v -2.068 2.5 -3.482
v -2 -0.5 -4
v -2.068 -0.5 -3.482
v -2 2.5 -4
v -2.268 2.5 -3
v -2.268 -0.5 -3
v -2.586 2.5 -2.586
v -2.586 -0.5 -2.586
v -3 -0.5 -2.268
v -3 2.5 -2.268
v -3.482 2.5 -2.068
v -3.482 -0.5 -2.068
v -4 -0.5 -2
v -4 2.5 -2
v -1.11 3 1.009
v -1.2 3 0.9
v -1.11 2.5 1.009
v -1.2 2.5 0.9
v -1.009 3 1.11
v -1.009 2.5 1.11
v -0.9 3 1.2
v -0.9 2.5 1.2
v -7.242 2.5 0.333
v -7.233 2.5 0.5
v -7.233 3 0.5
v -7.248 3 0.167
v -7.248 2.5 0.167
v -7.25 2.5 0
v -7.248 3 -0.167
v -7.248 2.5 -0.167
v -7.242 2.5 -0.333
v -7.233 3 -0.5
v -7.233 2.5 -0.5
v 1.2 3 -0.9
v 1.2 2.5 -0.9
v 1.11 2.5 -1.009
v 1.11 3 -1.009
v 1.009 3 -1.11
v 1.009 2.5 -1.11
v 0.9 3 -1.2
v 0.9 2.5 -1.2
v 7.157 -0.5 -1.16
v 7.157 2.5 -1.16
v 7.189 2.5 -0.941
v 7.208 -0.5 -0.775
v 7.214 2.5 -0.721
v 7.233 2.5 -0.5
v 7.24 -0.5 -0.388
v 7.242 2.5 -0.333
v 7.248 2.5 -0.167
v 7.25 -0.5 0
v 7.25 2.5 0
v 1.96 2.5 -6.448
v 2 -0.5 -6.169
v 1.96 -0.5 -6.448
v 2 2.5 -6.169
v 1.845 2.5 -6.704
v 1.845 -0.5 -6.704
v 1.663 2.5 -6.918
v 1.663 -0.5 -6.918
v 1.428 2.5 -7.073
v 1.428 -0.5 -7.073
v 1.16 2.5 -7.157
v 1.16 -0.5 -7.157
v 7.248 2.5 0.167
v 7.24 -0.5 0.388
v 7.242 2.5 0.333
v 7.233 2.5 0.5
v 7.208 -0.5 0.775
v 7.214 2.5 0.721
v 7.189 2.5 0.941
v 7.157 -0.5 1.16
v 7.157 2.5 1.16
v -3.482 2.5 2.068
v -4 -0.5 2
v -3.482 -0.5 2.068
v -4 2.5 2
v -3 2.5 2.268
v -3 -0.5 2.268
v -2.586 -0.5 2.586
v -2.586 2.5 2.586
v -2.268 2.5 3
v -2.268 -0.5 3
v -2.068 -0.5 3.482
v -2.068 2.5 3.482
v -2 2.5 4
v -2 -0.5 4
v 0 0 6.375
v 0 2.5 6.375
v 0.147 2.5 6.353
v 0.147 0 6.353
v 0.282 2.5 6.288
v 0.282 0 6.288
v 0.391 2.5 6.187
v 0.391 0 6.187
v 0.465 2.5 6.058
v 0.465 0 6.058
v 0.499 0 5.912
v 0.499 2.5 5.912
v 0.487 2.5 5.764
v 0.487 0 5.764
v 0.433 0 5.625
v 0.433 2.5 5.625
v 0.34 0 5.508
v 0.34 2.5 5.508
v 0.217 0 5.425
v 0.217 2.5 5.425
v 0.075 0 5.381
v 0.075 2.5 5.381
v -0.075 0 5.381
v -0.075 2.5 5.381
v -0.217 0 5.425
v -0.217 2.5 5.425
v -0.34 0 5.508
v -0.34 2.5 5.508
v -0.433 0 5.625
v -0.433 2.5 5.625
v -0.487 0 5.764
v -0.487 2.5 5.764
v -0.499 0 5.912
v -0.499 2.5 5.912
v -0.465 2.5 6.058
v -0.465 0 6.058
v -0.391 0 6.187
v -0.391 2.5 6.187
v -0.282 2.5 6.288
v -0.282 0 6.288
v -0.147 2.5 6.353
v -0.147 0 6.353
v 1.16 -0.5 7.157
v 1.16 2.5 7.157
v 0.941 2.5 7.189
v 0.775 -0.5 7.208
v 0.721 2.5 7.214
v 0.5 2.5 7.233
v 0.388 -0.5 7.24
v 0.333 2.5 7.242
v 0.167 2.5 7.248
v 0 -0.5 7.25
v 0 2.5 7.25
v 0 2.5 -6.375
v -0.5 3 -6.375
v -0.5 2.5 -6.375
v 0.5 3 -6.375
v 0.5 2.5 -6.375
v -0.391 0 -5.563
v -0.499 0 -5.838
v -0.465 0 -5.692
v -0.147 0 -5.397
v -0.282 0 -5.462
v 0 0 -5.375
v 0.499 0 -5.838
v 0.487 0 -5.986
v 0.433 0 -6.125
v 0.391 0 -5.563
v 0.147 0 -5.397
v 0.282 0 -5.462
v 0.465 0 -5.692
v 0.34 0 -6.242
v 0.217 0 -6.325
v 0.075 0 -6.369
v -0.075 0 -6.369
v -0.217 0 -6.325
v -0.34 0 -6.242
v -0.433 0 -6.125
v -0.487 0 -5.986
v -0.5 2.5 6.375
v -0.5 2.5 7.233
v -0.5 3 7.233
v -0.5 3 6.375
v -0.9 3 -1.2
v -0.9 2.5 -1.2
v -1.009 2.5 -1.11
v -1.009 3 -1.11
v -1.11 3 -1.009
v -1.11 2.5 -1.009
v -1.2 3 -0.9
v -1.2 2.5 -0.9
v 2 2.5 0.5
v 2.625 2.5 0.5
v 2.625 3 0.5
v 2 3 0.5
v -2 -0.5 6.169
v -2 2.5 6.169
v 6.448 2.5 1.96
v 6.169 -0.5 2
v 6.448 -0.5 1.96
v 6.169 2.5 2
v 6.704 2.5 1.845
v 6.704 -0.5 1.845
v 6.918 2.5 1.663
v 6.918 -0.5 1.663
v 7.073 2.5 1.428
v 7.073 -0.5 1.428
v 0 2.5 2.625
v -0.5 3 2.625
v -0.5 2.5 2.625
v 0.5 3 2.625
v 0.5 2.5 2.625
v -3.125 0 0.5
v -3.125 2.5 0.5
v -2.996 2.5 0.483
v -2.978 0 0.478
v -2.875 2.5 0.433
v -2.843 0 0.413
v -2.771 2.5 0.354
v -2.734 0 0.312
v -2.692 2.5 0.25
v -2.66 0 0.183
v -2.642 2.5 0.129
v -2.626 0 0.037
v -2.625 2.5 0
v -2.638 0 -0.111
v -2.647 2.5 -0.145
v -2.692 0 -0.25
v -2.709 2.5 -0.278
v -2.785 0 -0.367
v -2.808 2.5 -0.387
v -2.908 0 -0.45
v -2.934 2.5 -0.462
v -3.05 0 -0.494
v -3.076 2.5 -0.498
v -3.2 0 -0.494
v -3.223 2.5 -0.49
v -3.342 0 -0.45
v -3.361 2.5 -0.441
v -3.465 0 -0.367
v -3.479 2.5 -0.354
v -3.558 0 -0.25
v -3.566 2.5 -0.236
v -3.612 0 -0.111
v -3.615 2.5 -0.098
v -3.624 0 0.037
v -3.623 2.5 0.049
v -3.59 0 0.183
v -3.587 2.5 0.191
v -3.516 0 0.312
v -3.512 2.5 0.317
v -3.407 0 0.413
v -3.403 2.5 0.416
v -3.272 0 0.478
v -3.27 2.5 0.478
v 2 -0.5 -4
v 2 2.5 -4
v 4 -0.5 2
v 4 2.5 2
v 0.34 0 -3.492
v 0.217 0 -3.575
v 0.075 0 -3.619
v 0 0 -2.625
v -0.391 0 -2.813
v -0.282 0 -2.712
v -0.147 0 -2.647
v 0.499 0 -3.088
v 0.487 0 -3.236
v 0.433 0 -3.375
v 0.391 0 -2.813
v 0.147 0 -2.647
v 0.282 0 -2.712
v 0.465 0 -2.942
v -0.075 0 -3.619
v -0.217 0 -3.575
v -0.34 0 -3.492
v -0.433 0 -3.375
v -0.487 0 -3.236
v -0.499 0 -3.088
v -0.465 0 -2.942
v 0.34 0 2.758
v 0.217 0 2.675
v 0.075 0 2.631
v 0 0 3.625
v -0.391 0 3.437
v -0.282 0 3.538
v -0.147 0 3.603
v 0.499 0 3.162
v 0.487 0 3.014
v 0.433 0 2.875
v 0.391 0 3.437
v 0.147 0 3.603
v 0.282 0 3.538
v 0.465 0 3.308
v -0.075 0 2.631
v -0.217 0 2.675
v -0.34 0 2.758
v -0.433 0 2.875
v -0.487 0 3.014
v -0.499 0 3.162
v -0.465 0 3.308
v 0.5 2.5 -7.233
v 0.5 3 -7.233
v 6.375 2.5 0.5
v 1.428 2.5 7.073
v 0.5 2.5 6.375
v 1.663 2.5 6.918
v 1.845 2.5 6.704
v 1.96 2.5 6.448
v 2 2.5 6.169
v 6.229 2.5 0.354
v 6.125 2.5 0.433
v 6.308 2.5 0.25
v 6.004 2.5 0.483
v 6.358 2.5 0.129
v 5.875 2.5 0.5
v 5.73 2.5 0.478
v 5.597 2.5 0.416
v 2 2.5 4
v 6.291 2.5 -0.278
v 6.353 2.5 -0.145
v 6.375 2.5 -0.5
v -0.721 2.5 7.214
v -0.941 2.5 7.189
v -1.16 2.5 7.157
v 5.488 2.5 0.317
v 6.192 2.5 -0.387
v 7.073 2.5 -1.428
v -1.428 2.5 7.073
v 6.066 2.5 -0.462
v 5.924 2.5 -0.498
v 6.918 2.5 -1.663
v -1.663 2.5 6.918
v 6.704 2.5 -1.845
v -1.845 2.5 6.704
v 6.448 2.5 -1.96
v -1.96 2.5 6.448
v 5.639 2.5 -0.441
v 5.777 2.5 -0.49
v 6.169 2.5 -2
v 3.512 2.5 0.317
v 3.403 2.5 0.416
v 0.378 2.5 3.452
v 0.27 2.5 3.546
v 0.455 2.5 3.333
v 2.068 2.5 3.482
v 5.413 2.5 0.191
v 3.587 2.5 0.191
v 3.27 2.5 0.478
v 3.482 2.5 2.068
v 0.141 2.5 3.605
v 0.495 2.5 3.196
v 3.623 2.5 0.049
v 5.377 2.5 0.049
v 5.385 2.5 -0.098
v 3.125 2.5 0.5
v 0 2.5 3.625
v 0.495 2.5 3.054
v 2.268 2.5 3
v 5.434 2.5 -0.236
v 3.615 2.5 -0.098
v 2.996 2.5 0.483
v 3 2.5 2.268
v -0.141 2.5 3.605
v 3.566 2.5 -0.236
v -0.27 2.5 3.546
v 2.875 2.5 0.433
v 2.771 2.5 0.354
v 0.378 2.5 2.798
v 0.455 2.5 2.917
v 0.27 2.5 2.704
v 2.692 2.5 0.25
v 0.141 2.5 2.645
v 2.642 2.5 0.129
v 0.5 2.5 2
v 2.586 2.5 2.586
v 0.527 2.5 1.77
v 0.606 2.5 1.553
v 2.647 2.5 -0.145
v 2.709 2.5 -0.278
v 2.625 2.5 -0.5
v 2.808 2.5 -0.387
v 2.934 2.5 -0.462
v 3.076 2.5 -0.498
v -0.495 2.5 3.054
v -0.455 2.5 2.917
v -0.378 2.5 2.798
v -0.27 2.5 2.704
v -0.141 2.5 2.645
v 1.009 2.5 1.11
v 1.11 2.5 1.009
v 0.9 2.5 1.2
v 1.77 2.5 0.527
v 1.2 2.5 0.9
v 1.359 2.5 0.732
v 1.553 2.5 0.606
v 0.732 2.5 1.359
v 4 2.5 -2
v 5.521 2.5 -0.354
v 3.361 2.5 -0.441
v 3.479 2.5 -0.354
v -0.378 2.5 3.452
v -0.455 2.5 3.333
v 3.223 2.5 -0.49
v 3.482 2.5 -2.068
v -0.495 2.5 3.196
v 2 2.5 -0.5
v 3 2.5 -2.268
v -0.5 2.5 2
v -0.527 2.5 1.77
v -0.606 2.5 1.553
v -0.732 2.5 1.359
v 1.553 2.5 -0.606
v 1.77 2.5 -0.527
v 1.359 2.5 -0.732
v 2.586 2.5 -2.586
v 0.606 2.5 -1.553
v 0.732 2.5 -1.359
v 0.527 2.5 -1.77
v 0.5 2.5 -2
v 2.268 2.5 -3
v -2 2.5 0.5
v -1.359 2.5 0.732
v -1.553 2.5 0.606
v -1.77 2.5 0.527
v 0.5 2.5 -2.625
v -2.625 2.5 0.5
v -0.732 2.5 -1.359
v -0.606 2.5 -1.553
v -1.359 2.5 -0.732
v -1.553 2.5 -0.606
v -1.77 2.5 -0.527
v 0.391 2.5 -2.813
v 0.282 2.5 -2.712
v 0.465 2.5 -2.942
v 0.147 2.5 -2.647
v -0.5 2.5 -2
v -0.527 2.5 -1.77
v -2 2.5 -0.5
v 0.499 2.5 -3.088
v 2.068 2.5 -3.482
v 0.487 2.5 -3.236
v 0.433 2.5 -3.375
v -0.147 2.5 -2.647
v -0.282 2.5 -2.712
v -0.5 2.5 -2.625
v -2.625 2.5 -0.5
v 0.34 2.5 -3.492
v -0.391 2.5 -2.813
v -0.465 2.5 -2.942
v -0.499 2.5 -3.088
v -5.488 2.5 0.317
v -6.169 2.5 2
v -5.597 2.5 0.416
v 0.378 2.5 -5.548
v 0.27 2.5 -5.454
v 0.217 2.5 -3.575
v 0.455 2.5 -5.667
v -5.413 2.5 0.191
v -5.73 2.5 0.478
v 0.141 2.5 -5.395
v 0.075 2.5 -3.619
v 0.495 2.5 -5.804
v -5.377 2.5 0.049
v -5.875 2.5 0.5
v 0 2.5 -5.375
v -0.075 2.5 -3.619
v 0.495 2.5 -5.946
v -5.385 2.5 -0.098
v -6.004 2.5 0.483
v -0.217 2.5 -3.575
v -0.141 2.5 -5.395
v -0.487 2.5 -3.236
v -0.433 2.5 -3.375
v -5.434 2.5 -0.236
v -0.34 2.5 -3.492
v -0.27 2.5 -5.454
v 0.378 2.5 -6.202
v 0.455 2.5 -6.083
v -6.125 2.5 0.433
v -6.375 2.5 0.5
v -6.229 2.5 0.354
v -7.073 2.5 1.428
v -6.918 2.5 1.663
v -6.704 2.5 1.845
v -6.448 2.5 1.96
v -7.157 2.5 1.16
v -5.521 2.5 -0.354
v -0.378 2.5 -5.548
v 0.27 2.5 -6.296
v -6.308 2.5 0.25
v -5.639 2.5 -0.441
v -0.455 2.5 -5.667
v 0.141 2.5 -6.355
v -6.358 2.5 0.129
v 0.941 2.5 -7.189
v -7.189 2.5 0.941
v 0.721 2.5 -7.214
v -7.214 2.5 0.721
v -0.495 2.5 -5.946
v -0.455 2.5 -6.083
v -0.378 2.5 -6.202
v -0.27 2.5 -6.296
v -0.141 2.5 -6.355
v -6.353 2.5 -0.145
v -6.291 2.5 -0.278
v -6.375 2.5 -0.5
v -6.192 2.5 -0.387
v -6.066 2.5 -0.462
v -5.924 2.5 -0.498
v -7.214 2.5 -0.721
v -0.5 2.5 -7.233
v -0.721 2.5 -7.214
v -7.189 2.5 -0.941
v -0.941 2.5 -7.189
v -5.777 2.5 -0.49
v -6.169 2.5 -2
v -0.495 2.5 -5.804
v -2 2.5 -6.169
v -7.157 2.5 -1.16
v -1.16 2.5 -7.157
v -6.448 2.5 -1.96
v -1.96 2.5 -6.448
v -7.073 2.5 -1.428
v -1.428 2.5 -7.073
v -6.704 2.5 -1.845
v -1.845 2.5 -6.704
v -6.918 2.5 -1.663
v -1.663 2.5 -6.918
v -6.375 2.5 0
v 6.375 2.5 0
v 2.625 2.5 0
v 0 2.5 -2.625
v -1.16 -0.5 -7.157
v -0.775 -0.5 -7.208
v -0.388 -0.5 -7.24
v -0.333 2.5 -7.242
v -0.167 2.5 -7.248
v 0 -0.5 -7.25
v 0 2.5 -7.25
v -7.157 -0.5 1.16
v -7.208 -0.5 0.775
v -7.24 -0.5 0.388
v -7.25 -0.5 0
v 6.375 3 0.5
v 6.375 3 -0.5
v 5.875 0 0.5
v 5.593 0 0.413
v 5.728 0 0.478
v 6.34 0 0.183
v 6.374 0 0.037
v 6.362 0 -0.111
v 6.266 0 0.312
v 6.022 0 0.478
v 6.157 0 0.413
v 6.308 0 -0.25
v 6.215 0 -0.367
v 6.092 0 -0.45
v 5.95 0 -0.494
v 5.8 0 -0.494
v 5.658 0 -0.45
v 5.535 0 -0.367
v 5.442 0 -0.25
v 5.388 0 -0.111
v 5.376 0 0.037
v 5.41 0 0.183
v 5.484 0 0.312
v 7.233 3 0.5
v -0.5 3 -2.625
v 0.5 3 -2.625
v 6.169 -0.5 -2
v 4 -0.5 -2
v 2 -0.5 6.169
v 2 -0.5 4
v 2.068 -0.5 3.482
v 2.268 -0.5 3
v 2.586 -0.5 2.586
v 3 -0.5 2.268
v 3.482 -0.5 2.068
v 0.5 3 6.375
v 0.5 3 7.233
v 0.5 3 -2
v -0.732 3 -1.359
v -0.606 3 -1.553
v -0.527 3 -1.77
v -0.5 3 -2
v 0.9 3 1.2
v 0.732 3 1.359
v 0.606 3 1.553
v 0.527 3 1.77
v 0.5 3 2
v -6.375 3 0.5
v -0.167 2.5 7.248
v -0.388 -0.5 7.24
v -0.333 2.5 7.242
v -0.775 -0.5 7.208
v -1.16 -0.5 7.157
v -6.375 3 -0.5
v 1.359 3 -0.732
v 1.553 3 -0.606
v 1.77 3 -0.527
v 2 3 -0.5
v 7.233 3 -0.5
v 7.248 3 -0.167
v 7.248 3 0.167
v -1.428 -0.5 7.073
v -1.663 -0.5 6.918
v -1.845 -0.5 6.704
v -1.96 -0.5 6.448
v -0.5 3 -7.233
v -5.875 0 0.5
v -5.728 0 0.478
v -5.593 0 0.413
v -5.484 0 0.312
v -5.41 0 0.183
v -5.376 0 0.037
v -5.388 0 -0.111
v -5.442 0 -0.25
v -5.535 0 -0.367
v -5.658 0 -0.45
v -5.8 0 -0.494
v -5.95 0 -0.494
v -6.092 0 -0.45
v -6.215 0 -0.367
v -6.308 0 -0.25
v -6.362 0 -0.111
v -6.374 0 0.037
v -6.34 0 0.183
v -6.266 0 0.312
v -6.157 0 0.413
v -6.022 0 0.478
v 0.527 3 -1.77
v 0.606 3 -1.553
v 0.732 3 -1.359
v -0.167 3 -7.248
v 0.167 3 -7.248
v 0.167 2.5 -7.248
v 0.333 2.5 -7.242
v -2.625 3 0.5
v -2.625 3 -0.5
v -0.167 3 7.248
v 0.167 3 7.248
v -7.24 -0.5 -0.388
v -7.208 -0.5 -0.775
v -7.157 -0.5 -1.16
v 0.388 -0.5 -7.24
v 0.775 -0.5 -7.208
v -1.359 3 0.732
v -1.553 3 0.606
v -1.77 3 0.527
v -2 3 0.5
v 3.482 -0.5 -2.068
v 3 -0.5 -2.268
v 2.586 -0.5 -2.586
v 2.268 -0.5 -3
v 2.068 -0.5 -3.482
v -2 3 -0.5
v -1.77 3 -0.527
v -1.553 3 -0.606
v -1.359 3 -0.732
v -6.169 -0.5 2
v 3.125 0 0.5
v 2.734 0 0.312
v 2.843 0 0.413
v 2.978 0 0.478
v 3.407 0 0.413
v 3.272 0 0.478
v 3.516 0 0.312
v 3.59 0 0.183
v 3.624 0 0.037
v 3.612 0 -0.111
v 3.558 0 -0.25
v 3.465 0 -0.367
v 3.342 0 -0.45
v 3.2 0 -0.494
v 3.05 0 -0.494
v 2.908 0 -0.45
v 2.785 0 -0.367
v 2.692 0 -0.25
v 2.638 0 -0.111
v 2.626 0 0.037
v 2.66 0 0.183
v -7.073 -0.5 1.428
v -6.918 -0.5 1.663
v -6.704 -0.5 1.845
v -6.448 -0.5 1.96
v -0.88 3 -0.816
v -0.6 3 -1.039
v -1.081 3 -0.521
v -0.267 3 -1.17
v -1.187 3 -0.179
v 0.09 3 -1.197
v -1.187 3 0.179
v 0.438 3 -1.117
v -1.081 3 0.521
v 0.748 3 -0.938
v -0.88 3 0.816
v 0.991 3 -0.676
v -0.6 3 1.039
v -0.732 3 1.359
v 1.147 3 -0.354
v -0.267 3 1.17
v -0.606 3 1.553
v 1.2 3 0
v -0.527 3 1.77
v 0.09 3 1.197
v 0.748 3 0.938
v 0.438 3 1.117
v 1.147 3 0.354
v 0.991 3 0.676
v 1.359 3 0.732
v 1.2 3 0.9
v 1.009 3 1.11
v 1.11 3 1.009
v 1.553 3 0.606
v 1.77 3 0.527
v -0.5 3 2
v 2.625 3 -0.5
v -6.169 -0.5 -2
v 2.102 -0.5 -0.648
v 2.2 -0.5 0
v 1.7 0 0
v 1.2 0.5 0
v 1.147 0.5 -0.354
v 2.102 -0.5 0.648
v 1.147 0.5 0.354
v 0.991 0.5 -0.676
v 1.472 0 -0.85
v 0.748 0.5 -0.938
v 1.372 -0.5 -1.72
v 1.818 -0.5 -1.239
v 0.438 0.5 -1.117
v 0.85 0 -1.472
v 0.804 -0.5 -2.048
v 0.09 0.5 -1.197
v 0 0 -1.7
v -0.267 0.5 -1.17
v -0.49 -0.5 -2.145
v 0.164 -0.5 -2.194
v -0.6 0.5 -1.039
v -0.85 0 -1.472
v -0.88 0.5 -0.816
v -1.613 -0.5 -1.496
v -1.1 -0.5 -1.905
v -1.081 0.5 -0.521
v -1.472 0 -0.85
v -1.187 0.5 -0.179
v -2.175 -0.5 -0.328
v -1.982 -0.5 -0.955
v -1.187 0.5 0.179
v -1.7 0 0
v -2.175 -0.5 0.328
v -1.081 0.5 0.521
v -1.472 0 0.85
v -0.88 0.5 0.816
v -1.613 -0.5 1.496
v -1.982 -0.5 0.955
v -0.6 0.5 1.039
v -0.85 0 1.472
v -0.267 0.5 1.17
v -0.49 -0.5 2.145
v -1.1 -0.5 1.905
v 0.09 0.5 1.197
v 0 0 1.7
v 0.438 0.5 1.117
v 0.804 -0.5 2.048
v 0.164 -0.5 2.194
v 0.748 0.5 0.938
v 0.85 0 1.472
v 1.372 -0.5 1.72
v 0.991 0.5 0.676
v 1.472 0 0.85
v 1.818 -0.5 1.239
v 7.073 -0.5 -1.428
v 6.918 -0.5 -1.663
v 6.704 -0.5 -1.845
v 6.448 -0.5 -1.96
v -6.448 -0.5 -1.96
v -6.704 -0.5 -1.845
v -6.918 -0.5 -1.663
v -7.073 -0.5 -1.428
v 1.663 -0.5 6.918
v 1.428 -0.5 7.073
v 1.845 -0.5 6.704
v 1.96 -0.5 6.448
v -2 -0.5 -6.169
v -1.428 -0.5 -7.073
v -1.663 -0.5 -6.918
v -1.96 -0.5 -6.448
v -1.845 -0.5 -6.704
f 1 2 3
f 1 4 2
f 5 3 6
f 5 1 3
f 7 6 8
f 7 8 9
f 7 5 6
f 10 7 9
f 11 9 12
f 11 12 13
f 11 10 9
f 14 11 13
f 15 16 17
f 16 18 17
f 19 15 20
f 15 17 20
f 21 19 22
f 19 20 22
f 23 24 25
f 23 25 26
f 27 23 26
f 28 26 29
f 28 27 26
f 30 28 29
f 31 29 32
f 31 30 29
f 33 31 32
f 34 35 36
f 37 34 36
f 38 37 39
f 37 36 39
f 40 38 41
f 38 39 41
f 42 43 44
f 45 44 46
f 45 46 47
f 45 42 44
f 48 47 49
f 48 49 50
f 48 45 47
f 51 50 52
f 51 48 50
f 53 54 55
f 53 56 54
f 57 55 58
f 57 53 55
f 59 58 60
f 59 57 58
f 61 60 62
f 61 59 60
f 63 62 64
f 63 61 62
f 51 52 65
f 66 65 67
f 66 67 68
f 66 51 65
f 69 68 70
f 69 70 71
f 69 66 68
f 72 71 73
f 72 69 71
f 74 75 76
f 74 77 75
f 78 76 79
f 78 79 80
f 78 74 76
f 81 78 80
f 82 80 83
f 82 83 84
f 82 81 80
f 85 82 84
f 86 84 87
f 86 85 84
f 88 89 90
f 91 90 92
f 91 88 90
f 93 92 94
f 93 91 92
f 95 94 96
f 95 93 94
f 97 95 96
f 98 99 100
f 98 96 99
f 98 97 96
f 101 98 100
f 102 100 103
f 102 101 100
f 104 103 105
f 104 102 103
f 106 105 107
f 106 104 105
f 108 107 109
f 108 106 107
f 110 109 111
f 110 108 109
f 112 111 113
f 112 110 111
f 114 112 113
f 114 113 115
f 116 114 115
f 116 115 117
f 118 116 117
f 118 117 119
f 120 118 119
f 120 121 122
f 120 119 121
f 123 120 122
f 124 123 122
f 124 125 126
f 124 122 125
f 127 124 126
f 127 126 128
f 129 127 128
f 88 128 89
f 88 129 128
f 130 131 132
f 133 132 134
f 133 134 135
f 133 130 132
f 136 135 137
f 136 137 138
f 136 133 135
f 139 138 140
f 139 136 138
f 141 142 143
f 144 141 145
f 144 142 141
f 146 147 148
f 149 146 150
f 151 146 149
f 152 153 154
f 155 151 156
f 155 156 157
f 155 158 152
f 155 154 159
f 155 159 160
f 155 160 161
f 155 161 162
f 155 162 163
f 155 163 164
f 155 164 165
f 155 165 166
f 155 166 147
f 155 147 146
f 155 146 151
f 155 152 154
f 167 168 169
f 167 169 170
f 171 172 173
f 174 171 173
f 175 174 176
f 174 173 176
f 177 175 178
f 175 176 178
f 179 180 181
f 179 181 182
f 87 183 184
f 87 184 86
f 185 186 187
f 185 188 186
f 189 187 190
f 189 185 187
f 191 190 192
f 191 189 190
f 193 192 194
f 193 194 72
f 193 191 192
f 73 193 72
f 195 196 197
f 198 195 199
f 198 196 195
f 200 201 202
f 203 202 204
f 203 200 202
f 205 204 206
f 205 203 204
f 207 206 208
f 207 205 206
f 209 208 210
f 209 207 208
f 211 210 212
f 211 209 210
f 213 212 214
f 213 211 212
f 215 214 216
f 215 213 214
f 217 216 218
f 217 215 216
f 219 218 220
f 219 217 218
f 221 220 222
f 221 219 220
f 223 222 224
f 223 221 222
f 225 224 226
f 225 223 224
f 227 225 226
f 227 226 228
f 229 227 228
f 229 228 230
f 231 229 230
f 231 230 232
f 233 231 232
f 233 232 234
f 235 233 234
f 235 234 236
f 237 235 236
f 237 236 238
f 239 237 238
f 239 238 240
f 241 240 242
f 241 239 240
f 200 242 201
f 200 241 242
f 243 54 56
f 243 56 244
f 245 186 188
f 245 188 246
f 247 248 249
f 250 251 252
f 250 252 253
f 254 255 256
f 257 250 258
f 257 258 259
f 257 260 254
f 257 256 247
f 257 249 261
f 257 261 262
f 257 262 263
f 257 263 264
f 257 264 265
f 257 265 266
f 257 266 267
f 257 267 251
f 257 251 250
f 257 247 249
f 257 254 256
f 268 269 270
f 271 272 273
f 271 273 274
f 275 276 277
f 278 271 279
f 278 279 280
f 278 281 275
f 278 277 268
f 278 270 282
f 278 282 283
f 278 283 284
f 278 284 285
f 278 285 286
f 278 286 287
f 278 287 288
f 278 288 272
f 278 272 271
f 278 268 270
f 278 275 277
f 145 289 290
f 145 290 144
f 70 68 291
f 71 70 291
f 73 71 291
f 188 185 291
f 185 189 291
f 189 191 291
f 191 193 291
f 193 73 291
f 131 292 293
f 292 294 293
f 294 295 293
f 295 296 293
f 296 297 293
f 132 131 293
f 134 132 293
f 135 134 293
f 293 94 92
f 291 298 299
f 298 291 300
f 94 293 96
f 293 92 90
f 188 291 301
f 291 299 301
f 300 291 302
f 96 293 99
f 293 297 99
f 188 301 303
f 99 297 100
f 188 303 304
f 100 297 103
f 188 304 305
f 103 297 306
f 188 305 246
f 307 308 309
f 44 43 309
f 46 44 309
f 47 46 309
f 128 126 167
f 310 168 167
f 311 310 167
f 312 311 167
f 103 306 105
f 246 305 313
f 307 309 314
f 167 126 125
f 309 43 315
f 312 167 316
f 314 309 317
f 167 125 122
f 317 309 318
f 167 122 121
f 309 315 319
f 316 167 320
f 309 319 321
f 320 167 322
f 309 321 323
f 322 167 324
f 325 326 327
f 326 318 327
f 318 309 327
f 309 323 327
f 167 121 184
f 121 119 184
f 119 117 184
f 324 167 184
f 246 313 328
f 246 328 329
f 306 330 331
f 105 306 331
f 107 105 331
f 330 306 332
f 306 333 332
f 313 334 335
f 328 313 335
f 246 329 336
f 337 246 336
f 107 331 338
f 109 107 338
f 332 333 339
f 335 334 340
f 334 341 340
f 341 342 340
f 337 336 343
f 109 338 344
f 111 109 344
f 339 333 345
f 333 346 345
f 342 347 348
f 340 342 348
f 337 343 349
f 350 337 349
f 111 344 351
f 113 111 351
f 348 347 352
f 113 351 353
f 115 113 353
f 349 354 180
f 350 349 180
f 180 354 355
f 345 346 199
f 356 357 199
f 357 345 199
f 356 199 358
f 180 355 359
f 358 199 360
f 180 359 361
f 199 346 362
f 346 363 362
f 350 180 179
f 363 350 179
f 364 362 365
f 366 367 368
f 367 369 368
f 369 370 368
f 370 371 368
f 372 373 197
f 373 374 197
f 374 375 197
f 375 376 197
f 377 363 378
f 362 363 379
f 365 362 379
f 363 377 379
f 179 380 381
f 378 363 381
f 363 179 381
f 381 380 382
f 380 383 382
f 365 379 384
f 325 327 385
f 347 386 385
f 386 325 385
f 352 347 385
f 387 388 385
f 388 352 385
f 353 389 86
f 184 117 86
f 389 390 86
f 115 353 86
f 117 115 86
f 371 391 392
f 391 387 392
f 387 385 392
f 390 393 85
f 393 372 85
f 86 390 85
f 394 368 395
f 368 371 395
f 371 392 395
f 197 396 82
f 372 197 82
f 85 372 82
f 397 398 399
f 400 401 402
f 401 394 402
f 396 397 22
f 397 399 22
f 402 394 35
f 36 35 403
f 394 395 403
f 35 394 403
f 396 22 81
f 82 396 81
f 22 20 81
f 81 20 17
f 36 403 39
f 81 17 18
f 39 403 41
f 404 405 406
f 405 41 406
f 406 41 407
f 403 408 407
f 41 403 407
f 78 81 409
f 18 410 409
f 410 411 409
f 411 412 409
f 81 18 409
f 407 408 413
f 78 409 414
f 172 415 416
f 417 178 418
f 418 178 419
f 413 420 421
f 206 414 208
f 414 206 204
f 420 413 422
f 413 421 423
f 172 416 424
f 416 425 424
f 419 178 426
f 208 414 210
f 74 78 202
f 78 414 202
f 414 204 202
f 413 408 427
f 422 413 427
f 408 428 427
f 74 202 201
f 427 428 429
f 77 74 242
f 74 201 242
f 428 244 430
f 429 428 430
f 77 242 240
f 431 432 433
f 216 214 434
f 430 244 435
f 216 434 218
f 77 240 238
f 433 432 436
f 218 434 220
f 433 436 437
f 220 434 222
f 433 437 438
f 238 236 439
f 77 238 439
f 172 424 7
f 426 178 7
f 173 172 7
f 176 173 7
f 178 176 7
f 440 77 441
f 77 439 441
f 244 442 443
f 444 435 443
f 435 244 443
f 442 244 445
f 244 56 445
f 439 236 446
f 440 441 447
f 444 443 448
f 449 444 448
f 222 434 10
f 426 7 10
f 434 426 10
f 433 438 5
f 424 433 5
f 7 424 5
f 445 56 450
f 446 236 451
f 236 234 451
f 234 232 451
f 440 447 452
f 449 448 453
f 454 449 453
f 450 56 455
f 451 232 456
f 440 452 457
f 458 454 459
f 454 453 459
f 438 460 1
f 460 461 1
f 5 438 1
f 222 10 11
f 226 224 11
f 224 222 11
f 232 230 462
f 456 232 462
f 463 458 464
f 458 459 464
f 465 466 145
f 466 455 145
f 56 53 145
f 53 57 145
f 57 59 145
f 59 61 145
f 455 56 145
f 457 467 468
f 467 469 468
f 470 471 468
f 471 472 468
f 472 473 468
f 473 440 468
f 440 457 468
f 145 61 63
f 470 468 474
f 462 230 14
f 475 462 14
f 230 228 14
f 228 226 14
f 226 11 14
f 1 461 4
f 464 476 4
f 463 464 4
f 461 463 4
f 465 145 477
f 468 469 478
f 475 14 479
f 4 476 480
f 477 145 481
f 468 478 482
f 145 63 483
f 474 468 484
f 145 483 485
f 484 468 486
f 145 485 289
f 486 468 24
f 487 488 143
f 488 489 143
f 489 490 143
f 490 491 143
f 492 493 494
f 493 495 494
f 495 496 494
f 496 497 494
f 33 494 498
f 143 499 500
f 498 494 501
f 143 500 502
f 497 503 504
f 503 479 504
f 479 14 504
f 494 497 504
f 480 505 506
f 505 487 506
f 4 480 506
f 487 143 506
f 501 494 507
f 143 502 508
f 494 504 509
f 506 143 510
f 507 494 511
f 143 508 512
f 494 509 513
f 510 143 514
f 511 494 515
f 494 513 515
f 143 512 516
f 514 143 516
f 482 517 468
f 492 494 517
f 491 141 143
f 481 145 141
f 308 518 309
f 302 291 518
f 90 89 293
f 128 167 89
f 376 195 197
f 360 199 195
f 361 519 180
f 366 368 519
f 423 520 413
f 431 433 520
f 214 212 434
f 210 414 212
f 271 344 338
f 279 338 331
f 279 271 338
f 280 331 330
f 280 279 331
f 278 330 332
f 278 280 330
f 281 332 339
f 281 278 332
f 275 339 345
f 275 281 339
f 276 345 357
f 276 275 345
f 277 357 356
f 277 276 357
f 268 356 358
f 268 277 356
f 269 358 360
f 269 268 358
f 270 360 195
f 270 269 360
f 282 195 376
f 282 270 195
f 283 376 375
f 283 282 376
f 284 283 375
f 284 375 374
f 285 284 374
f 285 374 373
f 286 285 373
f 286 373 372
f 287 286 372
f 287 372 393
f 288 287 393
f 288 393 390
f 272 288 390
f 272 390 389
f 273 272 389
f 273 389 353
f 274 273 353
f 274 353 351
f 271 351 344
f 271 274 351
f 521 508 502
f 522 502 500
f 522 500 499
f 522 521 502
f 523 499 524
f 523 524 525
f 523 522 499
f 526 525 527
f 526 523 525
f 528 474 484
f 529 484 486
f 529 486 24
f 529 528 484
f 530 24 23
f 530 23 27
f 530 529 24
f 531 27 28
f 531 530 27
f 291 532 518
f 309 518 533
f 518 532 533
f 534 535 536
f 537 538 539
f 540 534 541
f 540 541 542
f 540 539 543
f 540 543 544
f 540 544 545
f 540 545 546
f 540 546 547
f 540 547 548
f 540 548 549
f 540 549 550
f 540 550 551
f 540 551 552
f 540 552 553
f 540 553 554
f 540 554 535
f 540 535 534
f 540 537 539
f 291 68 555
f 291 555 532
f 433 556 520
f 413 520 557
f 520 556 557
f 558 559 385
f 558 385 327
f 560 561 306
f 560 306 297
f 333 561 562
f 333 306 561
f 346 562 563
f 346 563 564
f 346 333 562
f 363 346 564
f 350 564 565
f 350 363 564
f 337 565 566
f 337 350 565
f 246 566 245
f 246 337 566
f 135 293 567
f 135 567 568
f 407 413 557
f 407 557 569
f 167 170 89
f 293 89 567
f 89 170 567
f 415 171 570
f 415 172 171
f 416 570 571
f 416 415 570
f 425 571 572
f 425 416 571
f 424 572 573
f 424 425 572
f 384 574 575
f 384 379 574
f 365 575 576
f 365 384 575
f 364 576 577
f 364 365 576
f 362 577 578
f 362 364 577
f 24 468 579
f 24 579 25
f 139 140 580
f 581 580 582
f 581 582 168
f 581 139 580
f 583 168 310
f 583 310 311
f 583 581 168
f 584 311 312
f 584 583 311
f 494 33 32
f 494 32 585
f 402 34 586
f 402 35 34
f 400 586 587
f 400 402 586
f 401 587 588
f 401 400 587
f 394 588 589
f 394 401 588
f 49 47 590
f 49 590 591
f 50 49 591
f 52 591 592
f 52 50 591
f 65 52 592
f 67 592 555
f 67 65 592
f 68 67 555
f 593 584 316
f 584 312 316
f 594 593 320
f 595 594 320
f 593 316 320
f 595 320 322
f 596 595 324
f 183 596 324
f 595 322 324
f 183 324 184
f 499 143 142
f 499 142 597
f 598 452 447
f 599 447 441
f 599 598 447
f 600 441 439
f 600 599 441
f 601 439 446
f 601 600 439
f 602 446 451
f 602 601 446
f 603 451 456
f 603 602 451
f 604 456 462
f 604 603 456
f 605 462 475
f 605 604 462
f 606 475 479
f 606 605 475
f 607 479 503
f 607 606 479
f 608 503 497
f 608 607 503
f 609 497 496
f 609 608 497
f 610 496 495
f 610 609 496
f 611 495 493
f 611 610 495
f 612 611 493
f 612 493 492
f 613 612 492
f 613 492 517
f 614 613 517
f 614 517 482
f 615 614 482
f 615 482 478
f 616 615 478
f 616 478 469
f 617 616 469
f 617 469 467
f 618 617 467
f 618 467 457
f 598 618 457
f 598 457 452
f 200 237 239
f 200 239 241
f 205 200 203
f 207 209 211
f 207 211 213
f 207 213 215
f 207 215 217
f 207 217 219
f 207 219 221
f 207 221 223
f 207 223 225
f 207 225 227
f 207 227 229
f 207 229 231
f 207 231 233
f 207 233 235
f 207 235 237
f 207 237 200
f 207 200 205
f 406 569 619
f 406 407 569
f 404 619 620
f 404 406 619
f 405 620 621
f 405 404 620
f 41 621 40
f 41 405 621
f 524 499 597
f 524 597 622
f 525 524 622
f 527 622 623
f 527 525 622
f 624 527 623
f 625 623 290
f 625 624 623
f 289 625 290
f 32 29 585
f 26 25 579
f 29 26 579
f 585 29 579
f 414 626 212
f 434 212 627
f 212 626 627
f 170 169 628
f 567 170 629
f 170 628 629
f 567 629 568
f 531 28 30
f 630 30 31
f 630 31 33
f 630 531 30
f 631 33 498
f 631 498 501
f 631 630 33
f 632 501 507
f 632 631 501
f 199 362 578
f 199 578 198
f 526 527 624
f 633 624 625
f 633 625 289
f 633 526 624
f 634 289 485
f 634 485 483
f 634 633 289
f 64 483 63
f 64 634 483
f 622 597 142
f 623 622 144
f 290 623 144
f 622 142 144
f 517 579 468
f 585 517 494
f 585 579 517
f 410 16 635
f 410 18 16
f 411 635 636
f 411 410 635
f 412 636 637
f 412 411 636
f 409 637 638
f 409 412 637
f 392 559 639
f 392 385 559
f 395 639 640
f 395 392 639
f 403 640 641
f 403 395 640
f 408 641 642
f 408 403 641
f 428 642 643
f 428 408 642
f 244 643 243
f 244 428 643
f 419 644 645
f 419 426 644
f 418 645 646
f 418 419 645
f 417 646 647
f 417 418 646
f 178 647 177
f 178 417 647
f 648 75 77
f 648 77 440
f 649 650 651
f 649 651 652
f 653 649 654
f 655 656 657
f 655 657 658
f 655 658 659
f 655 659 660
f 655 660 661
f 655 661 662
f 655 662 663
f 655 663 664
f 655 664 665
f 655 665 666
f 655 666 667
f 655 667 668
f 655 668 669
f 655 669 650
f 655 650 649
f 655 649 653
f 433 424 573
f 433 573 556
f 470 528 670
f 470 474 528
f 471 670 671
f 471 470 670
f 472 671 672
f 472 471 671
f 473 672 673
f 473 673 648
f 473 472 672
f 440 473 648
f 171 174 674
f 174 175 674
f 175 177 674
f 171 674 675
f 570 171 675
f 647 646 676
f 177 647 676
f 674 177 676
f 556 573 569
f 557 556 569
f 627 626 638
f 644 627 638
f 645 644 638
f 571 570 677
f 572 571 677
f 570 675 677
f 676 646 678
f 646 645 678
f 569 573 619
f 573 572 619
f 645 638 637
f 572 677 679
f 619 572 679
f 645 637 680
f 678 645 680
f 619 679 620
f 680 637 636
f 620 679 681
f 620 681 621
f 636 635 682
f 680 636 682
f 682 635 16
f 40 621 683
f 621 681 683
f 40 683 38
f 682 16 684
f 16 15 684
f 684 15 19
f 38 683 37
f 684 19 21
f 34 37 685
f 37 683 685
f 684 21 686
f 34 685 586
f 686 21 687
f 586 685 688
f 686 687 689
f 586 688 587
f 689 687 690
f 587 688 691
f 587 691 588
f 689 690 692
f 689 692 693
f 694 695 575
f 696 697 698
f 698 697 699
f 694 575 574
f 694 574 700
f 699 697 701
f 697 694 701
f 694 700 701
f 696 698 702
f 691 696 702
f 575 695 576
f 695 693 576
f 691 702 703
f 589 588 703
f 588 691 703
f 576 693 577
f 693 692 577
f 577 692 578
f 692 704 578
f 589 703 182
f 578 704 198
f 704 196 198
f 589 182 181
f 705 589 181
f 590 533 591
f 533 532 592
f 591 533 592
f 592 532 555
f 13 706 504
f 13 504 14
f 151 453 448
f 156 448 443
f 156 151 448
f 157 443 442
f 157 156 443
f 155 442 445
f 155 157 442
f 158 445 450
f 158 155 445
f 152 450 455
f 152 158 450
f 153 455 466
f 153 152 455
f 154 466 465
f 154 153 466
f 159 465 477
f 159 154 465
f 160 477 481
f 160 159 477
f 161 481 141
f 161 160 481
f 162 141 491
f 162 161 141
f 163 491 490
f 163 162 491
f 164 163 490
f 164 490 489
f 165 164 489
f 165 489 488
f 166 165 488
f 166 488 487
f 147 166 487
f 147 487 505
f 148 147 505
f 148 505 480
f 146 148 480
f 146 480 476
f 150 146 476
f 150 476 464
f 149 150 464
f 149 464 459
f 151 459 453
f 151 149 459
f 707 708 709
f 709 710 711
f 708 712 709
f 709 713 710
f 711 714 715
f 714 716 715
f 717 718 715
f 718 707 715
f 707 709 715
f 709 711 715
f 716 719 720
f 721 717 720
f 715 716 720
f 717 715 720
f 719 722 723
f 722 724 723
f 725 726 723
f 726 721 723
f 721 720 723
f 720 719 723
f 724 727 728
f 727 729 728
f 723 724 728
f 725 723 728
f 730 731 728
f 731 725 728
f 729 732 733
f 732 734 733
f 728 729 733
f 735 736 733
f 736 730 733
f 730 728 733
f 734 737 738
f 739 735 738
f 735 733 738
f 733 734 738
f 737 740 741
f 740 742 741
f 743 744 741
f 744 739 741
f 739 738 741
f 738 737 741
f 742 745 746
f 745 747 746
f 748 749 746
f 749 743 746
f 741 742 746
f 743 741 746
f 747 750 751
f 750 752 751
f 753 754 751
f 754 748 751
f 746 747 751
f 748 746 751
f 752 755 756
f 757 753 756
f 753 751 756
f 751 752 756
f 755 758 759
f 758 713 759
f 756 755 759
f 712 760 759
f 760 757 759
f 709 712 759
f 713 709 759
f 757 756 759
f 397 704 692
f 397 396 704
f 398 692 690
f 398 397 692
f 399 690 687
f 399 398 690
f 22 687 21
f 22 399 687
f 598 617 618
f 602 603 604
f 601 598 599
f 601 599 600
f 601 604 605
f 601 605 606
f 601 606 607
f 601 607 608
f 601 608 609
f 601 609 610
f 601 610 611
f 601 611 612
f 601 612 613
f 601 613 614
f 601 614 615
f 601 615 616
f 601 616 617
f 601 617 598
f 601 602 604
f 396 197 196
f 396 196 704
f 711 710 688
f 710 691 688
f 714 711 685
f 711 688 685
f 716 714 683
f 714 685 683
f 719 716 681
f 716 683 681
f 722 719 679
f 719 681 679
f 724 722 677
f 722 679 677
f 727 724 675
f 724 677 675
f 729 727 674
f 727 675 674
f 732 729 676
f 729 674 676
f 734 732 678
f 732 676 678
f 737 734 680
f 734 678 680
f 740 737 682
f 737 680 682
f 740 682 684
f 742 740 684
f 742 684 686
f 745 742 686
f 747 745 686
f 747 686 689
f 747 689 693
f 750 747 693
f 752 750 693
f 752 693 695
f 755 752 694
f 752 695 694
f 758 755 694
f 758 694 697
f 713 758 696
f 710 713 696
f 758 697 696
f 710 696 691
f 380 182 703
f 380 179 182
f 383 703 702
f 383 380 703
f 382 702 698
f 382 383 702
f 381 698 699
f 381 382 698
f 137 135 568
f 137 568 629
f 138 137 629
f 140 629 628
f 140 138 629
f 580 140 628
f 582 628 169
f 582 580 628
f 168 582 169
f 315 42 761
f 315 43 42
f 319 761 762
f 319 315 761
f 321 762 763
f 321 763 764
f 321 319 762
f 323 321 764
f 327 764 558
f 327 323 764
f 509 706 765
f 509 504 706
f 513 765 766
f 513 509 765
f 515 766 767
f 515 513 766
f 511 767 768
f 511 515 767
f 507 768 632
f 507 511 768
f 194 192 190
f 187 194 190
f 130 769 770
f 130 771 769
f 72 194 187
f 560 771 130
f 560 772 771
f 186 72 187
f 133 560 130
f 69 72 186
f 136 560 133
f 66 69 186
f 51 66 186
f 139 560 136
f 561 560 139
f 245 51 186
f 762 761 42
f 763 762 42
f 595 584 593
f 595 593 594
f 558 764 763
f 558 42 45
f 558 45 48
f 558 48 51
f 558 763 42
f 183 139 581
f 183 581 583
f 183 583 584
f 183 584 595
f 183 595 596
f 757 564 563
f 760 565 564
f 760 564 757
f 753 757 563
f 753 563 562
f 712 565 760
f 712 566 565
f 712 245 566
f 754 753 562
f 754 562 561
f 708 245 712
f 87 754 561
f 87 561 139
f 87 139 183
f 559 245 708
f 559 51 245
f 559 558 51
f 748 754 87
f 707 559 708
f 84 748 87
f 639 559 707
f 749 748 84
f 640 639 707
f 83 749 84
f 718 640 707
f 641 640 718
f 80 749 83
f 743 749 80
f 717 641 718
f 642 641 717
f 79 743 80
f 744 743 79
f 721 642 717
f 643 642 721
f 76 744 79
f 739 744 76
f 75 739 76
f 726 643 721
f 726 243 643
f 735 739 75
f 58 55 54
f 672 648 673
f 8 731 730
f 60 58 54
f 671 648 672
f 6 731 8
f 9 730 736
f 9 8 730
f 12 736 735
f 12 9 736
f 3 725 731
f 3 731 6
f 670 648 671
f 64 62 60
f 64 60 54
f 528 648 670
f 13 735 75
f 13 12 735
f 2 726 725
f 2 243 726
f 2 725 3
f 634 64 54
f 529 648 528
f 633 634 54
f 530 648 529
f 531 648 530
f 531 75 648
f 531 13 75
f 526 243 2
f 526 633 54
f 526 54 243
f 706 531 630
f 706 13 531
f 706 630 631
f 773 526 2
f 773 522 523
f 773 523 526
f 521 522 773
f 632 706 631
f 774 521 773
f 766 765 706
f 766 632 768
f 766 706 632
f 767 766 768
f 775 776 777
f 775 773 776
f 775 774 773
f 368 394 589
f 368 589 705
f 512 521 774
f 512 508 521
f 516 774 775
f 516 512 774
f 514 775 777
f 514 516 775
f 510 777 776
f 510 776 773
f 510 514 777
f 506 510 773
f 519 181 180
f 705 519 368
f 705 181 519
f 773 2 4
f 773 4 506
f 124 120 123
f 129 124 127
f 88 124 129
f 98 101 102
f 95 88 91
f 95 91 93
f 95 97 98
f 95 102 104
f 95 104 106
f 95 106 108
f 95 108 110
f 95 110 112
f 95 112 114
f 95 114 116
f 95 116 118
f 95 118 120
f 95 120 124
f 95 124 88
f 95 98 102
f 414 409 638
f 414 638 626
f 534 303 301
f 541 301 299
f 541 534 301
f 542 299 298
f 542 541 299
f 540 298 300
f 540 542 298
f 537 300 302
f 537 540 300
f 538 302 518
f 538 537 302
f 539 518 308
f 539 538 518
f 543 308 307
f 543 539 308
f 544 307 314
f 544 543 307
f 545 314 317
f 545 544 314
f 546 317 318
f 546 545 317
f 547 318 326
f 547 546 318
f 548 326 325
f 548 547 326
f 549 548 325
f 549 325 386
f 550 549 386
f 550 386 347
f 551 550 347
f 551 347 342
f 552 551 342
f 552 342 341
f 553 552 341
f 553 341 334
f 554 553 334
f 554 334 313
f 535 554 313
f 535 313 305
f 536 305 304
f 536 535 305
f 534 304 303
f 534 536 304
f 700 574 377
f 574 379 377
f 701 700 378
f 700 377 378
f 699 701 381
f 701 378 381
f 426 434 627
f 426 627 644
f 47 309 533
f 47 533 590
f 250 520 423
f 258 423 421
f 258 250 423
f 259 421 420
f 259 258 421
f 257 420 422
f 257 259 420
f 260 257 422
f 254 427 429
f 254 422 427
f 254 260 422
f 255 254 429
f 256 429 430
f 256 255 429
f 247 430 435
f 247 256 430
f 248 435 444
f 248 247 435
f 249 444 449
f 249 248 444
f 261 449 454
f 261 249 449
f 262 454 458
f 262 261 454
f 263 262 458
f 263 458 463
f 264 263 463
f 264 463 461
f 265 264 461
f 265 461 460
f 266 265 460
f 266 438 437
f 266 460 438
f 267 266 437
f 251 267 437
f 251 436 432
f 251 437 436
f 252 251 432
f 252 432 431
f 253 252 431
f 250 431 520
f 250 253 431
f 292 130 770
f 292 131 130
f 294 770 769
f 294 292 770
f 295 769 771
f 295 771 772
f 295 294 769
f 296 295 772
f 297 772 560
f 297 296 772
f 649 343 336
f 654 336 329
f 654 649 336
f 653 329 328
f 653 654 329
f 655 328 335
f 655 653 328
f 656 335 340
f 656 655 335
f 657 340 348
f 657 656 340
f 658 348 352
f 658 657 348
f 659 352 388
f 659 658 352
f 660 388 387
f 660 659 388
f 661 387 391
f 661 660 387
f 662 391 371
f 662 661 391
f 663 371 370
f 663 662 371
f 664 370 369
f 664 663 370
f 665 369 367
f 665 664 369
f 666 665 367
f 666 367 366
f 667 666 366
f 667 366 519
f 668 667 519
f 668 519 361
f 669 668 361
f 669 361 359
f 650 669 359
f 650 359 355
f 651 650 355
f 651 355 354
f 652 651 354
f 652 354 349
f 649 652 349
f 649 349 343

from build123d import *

# Parameters (mm, degrees)
BOSS_EXTRUDE1_DEPTH                             = 2.5
BOSS_EXTRUDE1_DEPTH_BACK                        = 0.5
BOSS_EXTRUDE2_DEPTH                             = 0.5
FILLET1_R                                       = 1
CUT_EXTRUDE1_START                              = -3
SKETCH5_R                                       = 0.5
CUT_EXTRUDE1_DEPTH                              = 3
SKETCH10_W                                      = 1
SKETCH10_H                                      = 3.75
SKETCH10_W_2                                    = 3.75
SKETCH10_H_2                                    = 1
CUT_EXTRUDE2_DEPTH                              = 0.5
SKETCH17_R                                      = 1.5
BOSS_EXTRUDE3_DEPTH                             = 0.5
CSK_FOR_M2_FLAT_HEAD_MACHINE_SCREW1_D           = 2.4
CSK_FOR_M2_FLAT_HEAD_MACHINE_SCREW1_DEPTH       = 6
CSK_FOR_M2_FLAT_HEAD_MACHINE_SCREW1_CSINK_D     = 4.4
CSK_FOR_M2_FLAT_HEAD_MACHINE_SCREW1_CSINK_ANGLE = 90
CSK_FOR_M2_FLAT_HEAD_MACHINE_SCREW1_TIP         = 0.721032743
FILLET2_R                                       = 2
FILLET3_R                                       = 1


with BuildPart() as part:
    # Sketch3 → Boss-Extrude1 (new, two sides: drawn at the far end of the back side and taken through both)
    with BuildSketch(Plane(origin=(0, 0, 0), x_dir=(1, 0, 0), z_dir=(0, 1, 0)).offset(-BOSS_EXTRUDE1_DEPTH_BACK)):
        with BuildLine():
            Line((-2, -6.968679932), (-2, -2))
            Line((-2, -2), (-6.968679932, -2))
            ThreePointArc((-6.968679932, -2), (-7.179325508, -1.009844169), (-7.25, 0))
            ThreePointArc((-7.25, 0), (-7.179325508, 1.009844169), (-6.968679932, 2))
            Line((-6.968679932, 2), (-2, 2))
            Line((-2, 2), (-2, 6.968679932))
            ThreePointArc((-2, 6.968679932), (-1.009844169, 7.179325508), (0, 7.25))
            ThreePointArc((0, 7.25), (1.009844169, 7.179325508), (2, 6.968679932))
            Line((2, 6.968679932), (2, 2))
            Line((2, 2), (6.968679932, 2))
            ThreePointArc((6.968679932, 2), (7.179325508, 1.009844169), (7.25, 0))
            ThreePointArc((7.25, 0), (7.179325508, -1.009844169), (6.968679932, -2))
            Line((6.968679932, -2), (2, -2))
            Line((2, -2), (2, -6.968679932))
            ThreePointArc((2, -6.968679932), (1.009844169, -7.179325508), (0, -7.25))
            ThreePointArc((0, -7.25), (-1.009844169, -7.179325508), (-2, -6.968679932))
        make_face()
    extrude(amount=BOSS_EXTRUDE1_DEPTH + BOSS_EXTRUDE1_DEPTH_BACK)

    # Sketch4 → Boss-Extrude2 (add)
    with BuildSketch(Plane(origin=(0, 2.5, 0), x_dir=(-1, 0, 0), z_dir=(0, 1, 0))):
        with BuildLine():
            Line((-0.5, 5.875), (-0.5, 7.232738071))
            ThreePointArc((-0.5, 7.232738071), (0, 7.25), (0.5, 7.232738071))
            Line((0.5, 7.232738071), (0.5, 5.875))
            ThreePointArc((0.5, 5.875), (0, 5.375), (-0.5, 5.875))
        make_face()
        with BuildLine():
            Line((0.5, 3.125), (0.5, 0.5))
            Line((0.5, 0.5), (3.125, 0.5))
            ThreePointArc((3.125, 0.5), (3.625, 0), (3.125, -0.5))
            Line((3.125, -0.5), (0.5, -0.5))
            Line((0.5, -0.5), (0.5, -3.125))
            ThreePointArc((0.5, -3.125), (0, -3.625), (-0.5, -3.125))
            Line((-0.5, -3.125), (-0.5, -0.5))
            Line((-0.5, -0.5), (-3.125, -0.5))
            ThreePointArc((-3.125, -0.5), (-3.625, 0), (-3.125, 0.5))
            Line((-3.125, 0.5), (-0.5, 0.5))
            Line((-0.5, 0.5), (-0.5, 3.125))
            ThreePointArc((-0.5, 3.125), (0, 3.625), (0.5, 3.125))
        make_face()
        with BuildLine():
            Line((5.875, 0.5), (7.232738071, 0.5))
            ThreePointArc((7.232738071, 0.5), (7.25, 0), (7.232738071, -0.5))
            Line((7.232738071, -0.5), (5.875, -0.5))
            ThreePointArc((5.875, -0.5), (5.375, 0), (5.875, 0.5))
        make_face()
        with BuildLine():
            Line((0.5, -5.875), (0.5, -7.232738071))
            ThreePointArc((0.5, -7.232738071), (0, -7.25), (-0.5, -7.232738071))
            Line((-0.5, -7.232738071), (-0.5, -5.875))
            ThreePointArc((-0.5, -5.875), (0, -5.375), (0.5, -5.875))
        make_face()
        with BuildLine():
            Line((-5.875, -0.5), (-7.232738071, -0.5))
            ThreePointArc((-7.232738071, -0.5), (-7.25, 0), (-7.232738071, 0.5))
            Line((-7.232738071, 0.5), (-5.875, 0.5))
            ThreePointArc((-5.875, 0.5), (-5.375, 0), (-5.875, -0.5))
        make_face()
    extrude(amount=BOSS_EXTRUDE2_DEPTH)

    # Fillet1
    fillet1_edges = [part.edges().sort_by_distance(p)[0] for p in [
        (-2, 1, 6.968679932),
        (-6.968679932, 1, 2),
        (-6.968679932, 1, -2),
        (-2, 1, -6.968679932),
        (2, 1, -6.968679932),
        (6.968679932, 1, -2),
        (6.968679932, 1, 2),
        (2, 1, 6.968679932),
    ]]
    fillet(fillet1_edges, radius=FILLET1_R)

    # Sketch5 → Cut-Extrude1 (cut)
    with BuildSketch(Plane(origin=(0, 3, 0), x_dir=(-1, 0, 0), z_dir=(0, 1, 0)).offset(CUT_EXTRUDE1_START)):
        with Locations(Location((0, 5.875, 0), (0, 0, 90))):
            Circle(SKETCH5_R)
        with Locations(Location((0, 3.125, 0), (0, 0, 90))):
            Circle(SKETCH5_R)
        with Locations(Location((5.875, 0, 0), (0, 0, 90))):
            Circle(SKETCH5_R)
        with Locations(Location((3.125, 0, 0), (0, 0, 90))):
            Circle(SKETCH5_R)
        with Locations(Location((0, -5.875, 0), (0, 0, 90))):
            Circle(SKETCH5_R)
        with Locations(Location((0, -3.125, 0), (0, 0, 90))):
            Circle(SKETCH5_R)
        with Locations(Location((-5.875, 0, 0), (0, 0, 90))):
            Circle(SKETCH5_R)
        with Locations(Location((-3.125, 0, 0), (0, 0, 90))):
            Circle(SKETCH5_R)
    extrude(amount=CUT_EXTRUDE1_DEPTH, mode=Mode.SUBTRACT)

    # Sketch10 → Cut-Extrude2 (cut)
    with BuildSketch(Plane(origin=(0, 3, 0), x_dir=(1, 0, 0), z_dir=(0, 1, 0))):
        with Locations((0, -4.5)):
            Rectangle(SKETCH10_W, SKETCH10_H)
        with Locations((-4.5, 0)):
            Rectangle(SKETCH10_W_2, SKETCH10_H_2)
        with Locations((0, 4.5)):
            Rectangle(SKETCH10_W, SKETCH10_H)
        with Locations((4.5, 0)):
            Rectangle(SKETCH10_W_2, SKETCH10_H_2)
    extrude(amount=-CUT_EXTRUDE2_DEPTH, mode=Mode.SUBTRACT)

    # Sketch17 → Boss-Extrude3 (add)
    with BuildSketch(Plane(origin=(0, 2.5, 0), x_dir=(1, 0, 0), z_dir=(0, 1, 0))):
        Circle(SKETCH17_R)
    extrude(amount=BOSS_EXTRUDE3_DEPTH)

    # CSK for M2 Flat Head Machine Screw1
    with Locations(Plane(origin=(0, -0.5, 0), x_dir=(-1, 0, 0), z_dir=(0, -1, 0))):
        with Locations((0, 0)):
            CounterSinkHole(CSK_FOR_M2_FLAT_HEAD_MACHINE_SCREW1_D / 2, CSK_FOR_M2_FLAT_HEAD_MACHINE_SCREW1_CSINK_D / 2, depth=CSK_FOR_M2_FLAT_HEAD_MACHINE_SCREW1_DEPTH, counter_sink_angle=CSK_FOR_M2_FLAT_HEAD_MACHINE_SCREW1_CSINK_ANGLE)
            with Locations((0, 0, -(CSK_FOR_M2_FLAT_HEAD_MACHINE_SCREW1_DEPTH + CSK_FOR_M2_FLAT_HEAD_MACHINE_SCREW1_TIP / 2))):  # 118° drill point
                Cone(0, CSK_FOR_M2_FLAT_HEAD_MACHINE_SCREW1_D / 2, CSK_FOR_M2_FLAT_HEAD_MACHINE_SCREW1_TIP, mode=Mode.SUBTRACT)

    # Fillet2
    fillet2_edges = [part.edges().sort_by_distance(p)[0] for p in [
        (-2, 1, 2),
        (-2, 1, -2),
        (2, 1, -2),
        (2, 1, 2),
    ]]
    fillet(fillet2_edges, radius=FILLET2_R)

    # Fillet3
    fillet3_edges = [part.edges().sort_by_distance(p)[0] for p in [
        (0.5, 2.75, 1.414213562),
        (1.414213562, 2.75, 0.5),
        (1.414213562, 2.75, -0.5),
        (0.5, 2.75, -1.414213562),
        (-0.5, 2.75, -1.414213562),
        (-1.414213562, 2.75, -0.5),
        (-1.414213562, 2.75, 0.5),
        (-0.5, 2.75, 1.414213562),
    ]]
    fillet(fillet3_edges, radius=FILLET3_R)


solid = part.part
